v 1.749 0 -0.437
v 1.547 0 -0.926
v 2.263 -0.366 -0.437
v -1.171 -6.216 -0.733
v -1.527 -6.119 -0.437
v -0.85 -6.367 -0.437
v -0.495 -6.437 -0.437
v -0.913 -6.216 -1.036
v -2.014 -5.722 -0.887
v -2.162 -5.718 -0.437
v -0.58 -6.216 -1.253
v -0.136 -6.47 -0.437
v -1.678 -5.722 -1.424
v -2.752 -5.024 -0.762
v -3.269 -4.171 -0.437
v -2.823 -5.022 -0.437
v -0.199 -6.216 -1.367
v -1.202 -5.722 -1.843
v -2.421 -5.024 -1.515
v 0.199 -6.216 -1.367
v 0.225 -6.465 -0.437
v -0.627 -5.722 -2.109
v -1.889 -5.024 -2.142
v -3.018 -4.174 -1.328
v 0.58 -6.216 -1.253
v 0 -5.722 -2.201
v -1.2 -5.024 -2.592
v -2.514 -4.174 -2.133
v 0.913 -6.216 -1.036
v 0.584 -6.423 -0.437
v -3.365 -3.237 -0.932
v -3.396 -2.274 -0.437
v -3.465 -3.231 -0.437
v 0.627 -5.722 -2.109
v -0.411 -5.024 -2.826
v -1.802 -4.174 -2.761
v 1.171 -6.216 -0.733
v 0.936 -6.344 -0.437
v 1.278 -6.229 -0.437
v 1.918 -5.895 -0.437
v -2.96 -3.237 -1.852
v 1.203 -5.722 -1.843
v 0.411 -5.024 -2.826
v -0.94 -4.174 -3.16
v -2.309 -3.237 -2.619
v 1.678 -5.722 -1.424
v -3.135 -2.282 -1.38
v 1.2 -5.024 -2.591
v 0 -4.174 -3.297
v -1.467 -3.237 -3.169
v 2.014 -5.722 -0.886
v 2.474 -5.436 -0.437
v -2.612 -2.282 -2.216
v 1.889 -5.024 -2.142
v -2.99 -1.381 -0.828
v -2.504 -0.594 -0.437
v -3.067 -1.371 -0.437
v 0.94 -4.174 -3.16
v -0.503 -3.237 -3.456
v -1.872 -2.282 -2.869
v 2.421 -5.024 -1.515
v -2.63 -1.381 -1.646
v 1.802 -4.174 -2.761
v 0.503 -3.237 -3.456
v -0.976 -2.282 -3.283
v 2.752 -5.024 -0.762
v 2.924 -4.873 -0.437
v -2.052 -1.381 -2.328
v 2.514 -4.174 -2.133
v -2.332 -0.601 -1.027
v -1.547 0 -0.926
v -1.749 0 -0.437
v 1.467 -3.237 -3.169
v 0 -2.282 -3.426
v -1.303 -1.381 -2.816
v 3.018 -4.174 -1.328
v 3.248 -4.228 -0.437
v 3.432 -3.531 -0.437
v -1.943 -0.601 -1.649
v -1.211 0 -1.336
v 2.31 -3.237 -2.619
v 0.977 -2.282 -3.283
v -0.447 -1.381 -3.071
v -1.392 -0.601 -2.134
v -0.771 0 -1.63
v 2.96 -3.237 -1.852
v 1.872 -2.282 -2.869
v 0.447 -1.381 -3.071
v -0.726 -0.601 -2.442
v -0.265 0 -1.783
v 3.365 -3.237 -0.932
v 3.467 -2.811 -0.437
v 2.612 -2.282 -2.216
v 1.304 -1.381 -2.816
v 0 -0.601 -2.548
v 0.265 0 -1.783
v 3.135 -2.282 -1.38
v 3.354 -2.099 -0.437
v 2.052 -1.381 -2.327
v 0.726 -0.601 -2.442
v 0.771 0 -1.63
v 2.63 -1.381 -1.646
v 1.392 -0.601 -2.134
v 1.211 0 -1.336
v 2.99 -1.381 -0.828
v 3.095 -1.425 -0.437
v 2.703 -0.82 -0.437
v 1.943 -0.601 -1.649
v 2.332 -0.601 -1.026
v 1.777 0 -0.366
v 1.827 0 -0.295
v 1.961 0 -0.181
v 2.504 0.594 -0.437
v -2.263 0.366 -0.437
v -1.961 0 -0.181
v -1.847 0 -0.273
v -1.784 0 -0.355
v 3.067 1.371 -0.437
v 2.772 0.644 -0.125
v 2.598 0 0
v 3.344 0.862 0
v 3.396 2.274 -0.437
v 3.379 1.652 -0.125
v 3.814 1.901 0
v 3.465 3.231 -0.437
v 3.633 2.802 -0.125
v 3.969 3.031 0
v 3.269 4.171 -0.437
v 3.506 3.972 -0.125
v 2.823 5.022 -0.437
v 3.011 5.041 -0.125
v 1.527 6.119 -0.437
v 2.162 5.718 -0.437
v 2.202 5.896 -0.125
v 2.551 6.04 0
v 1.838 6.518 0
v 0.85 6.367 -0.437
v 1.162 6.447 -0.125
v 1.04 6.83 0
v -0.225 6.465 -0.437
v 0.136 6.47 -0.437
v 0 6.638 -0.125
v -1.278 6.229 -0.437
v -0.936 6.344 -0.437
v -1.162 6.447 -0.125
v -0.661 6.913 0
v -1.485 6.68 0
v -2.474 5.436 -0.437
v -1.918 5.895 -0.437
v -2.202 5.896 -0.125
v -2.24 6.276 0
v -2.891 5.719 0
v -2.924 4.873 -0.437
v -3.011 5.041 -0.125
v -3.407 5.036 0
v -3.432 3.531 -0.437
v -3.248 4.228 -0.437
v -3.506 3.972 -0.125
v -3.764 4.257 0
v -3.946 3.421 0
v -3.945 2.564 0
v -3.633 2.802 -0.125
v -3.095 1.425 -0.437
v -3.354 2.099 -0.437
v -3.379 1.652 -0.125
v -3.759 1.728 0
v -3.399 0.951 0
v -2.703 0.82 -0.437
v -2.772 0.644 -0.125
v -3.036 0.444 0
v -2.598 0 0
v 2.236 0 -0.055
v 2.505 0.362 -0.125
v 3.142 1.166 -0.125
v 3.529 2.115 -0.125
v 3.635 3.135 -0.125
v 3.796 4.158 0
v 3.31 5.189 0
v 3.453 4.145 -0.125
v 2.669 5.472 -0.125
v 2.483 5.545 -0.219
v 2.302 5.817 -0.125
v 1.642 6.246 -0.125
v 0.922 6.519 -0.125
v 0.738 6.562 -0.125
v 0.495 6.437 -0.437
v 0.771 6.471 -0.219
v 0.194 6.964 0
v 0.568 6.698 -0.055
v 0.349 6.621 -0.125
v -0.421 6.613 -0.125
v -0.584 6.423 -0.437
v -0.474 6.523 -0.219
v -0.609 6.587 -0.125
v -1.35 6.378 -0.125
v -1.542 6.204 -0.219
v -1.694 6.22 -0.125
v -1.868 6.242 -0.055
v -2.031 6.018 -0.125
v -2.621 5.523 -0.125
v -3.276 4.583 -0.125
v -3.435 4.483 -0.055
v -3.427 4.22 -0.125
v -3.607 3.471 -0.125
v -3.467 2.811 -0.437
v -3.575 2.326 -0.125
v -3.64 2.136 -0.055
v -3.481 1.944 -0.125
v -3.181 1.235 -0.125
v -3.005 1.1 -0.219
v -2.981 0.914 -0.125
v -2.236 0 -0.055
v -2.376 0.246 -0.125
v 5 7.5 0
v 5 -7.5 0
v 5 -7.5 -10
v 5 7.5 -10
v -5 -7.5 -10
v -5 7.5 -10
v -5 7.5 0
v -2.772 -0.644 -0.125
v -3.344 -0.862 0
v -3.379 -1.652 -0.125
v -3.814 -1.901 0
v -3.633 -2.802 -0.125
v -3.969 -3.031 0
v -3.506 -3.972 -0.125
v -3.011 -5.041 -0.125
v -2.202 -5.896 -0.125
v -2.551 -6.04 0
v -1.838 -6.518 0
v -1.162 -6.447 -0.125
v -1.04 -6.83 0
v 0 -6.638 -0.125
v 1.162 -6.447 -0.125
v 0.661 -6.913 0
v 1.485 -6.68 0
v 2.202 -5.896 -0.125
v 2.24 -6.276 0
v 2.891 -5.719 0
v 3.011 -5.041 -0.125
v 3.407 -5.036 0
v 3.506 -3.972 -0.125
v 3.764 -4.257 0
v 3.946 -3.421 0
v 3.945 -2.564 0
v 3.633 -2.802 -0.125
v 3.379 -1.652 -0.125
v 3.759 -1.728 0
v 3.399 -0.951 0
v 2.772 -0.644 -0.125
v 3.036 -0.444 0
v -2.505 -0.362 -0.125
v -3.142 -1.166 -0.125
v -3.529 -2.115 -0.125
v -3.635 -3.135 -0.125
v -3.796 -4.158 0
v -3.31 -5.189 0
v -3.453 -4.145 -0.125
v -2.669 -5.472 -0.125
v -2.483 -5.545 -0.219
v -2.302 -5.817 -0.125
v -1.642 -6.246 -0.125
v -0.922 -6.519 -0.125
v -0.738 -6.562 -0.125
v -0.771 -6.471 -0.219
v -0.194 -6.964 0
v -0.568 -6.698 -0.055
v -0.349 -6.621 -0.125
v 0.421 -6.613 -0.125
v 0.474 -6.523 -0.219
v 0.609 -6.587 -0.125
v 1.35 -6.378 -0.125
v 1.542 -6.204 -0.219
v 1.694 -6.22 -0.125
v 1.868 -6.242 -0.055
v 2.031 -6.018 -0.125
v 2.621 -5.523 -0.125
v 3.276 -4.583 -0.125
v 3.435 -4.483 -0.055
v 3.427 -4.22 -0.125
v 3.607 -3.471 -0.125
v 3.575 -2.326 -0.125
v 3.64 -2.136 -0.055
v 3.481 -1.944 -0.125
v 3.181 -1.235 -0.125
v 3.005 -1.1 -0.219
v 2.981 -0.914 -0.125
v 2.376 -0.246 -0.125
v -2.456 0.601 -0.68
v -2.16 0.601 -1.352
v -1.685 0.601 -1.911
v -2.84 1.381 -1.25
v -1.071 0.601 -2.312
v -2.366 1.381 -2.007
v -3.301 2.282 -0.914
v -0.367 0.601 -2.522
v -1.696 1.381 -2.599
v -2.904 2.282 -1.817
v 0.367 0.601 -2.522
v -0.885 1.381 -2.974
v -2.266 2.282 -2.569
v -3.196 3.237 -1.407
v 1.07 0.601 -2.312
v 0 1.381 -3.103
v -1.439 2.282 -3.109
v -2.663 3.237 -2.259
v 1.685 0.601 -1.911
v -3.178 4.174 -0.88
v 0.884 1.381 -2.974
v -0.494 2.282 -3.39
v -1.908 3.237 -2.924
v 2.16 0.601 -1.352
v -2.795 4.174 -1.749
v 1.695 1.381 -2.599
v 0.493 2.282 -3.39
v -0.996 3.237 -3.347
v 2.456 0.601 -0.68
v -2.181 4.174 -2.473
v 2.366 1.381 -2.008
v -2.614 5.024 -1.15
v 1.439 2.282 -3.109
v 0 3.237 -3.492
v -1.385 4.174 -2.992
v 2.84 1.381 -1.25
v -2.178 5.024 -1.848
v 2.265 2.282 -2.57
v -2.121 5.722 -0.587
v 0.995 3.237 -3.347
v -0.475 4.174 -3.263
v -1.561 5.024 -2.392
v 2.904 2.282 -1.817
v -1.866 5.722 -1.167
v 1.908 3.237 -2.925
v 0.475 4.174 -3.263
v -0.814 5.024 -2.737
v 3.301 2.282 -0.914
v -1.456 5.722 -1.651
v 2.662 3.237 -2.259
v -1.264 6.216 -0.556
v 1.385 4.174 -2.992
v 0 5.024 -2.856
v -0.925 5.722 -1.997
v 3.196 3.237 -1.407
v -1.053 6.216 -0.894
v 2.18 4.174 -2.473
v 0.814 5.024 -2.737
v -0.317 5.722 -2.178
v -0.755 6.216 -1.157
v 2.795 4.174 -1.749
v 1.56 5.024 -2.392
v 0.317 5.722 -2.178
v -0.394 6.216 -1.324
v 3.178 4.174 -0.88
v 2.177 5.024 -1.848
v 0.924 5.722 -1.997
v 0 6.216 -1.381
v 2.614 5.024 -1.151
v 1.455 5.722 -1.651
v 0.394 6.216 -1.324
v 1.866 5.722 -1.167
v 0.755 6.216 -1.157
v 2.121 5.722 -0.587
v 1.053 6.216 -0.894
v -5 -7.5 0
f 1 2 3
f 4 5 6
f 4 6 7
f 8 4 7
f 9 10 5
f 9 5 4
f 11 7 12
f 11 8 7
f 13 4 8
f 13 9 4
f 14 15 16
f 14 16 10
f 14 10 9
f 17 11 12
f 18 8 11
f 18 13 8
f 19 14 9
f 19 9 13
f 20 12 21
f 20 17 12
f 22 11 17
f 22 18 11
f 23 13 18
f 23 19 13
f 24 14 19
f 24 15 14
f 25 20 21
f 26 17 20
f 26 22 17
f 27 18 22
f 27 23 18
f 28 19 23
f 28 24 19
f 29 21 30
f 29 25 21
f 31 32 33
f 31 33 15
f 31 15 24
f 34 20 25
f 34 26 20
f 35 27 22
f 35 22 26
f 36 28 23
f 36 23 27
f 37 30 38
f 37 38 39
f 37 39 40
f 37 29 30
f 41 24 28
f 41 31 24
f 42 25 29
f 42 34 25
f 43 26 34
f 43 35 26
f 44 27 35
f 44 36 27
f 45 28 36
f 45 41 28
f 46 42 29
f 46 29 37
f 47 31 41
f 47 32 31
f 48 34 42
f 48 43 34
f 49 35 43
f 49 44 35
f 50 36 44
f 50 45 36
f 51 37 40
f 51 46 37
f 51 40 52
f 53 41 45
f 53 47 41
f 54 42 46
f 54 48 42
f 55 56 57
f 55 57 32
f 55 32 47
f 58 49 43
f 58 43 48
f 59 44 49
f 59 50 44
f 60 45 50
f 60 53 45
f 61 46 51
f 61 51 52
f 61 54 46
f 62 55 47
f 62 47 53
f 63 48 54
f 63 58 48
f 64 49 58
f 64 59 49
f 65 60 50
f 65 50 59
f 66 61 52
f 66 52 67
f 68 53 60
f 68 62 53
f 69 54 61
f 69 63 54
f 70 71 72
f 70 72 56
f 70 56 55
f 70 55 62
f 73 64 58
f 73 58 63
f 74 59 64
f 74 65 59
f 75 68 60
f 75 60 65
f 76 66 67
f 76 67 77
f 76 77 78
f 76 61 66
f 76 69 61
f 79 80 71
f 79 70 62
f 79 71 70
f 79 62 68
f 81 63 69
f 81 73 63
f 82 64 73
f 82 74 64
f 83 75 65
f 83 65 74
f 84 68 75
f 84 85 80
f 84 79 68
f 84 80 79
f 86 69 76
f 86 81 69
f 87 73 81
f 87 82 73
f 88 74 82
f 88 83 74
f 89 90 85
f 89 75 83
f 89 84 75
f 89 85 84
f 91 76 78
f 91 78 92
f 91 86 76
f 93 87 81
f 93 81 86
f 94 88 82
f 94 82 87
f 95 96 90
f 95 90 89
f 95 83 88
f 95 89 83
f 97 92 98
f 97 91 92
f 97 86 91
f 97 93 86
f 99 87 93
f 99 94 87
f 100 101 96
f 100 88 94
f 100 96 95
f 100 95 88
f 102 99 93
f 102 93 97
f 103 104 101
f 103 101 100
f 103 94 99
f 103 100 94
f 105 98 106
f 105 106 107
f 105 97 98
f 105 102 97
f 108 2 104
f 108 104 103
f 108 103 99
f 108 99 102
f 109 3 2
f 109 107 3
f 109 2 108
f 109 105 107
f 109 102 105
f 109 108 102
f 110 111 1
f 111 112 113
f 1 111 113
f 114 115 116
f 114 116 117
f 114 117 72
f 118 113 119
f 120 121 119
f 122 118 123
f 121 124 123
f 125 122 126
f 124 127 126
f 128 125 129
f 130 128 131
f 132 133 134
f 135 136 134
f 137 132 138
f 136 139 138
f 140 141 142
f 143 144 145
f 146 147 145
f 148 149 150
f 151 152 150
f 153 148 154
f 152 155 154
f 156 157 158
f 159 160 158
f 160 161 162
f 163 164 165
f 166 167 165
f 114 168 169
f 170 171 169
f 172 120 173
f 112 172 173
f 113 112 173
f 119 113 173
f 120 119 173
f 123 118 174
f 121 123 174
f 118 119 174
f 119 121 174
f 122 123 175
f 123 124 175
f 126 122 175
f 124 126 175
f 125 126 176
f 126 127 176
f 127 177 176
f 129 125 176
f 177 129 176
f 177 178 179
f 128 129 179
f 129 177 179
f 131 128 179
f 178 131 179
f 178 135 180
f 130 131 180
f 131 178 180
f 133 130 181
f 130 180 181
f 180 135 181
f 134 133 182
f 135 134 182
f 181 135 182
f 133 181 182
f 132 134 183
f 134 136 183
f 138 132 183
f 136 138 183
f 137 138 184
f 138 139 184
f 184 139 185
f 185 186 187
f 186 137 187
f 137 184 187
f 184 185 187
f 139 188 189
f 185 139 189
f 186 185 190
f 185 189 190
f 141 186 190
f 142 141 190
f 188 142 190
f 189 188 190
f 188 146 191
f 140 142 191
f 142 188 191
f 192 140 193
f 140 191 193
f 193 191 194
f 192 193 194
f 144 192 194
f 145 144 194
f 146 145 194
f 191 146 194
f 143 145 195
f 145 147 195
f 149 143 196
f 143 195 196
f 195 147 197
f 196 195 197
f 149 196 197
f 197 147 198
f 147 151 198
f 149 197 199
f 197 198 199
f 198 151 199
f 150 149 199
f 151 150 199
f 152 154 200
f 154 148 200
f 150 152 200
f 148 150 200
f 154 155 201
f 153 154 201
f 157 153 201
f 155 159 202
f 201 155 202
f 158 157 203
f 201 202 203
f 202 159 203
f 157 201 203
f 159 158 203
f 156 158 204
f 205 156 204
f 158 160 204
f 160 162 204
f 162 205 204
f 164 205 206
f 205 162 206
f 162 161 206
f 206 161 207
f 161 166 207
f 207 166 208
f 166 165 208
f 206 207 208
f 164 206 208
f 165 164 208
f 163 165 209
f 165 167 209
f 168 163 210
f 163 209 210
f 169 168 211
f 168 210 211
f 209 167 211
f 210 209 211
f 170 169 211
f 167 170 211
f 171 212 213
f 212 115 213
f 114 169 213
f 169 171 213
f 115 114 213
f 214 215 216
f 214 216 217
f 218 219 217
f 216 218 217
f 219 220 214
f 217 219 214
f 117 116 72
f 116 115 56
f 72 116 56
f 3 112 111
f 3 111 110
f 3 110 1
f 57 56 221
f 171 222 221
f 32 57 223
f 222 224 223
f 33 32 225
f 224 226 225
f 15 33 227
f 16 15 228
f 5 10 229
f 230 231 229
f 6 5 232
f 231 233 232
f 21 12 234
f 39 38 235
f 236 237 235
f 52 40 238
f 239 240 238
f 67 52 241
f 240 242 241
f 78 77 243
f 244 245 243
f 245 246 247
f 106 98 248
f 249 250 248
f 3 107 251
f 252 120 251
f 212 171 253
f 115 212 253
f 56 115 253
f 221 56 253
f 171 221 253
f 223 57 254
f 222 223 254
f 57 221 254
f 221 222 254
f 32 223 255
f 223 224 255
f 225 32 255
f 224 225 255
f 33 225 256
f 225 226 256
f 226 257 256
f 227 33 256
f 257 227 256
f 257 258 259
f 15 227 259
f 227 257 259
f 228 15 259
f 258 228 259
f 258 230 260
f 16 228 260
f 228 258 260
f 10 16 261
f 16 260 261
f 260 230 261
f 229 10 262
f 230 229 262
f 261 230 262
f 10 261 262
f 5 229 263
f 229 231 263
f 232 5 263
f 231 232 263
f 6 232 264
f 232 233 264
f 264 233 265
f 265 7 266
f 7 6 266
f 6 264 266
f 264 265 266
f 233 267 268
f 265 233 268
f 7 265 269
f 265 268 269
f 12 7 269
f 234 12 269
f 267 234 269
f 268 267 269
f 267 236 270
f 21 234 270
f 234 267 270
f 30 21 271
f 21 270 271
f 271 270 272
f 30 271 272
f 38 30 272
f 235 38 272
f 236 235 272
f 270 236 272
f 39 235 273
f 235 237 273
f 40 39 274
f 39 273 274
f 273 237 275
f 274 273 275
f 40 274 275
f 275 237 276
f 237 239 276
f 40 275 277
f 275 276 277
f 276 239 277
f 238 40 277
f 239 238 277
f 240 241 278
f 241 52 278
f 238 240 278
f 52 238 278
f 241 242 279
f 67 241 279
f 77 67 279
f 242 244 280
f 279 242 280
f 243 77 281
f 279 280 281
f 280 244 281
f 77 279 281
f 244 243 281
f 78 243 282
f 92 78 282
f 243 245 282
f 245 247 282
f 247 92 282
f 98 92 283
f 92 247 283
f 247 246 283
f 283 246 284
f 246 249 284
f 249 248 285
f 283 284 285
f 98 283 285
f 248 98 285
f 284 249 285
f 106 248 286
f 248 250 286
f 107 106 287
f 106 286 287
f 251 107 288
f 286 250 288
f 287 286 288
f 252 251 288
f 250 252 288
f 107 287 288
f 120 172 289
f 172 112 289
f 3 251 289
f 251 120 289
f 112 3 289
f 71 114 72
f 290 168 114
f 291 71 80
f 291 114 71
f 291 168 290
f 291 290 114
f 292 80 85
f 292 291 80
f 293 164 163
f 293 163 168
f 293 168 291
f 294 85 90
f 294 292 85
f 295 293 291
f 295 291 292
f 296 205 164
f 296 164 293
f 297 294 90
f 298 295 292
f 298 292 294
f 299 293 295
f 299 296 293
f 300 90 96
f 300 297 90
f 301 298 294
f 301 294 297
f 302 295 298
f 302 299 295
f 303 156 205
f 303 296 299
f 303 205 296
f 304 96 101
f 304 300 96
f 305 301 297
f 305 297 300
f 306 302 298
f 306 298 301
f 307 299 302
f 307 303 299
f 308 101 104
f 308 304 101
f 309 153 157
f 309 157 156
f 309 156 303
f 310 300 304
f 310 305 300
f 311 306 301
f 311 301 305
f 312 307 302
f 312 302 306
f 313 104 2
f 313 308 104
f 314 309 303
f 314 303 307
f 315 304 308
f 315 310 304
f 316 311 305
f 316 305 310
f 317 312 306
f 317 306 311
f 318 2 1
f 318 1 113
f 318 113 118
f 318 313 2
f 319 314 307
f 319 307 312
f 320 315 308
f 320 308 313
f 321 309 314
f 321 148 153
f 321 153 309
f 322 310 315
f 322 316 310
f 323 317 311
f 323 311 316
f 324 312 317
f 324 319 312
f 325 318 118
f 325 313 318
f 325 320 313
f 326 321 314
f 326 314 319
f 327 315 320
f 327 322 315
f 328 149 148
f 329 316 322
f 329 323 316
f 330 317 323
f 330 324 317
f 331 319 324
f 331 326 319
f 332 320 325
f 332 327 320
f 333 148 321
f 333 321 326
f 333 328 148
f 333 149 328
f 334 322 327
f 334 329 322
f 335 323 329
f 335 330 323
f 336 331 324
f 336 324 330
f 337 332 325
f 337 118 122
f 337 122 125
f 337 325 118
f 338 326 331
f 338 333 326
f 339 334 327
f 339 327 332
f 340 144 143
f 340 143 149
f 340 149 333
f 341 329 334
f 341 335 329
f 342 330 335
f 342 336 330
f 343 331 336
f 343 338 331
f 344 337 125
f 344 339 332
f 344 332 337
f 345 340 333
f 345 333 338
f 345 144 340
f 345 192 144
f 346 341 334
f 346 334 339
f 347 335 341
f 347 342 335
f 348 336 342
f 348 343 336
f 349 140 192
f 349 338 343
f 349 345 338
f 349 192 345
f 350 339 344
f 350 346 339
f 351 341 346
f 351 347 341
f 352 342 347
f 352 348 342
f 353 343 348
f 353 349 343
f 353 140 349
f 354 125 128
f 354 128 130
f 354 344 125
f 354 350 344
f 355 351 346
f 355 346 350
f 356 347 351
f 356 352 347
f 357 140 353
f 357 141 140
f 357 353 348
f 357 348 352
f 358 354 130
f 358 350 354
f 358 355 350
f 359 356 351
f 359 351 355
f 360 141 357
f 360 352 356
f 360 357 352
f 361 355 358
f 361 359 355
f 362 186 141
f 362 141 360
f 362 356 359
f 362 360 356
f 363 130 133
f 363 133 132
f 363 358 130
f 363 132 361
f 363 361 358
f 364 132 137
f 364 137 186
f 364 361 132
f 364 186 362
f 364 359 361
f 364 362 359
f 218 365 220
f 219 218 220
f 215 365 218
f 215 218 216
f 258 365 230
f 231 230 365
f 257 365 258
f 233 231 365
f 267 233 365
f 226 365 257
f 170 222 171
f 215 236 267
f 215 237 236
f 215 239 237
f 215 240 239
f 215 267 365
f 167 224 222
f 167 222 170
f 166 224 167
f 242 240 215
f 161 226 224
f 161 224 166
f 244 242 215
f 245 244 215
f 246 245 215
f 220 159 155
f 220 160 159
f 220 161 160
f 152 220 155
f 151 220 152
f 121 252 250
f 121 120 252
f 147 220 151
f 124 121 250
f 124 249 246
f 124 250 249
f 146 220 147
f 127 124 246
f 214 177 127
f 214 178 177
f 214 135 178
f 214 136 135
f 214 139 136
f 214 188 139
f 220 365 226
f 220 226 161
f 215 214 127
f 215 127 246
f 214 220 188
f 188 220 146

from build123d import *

# Parameters (mm, degrees)
F0_W     = 10
F0_H     = 15
F1_DEPTH = 10
F4_R     = 0.5


with BuildPart() as f1:
    # F0 (on Top) → F1 (new body)
    with BuildSketch(Plane.XY):
        Rectangle(F0_W, F0_H)
    extrude(amount=-F1_DEPTH)

    # F2 (on face) → F3 (revolve, cut)
    with BuildSketch(Plane.XY):
        with BuildLine():
            ThreePointArc((1.8027756377, 0), (3.3726843908, 3.9354143467), (0, 6.5))
            Line((0, 6.5), (0, 0.5))
            ThreePointArc((0, 0.5), (0.9354143467, 0.3726843908), (1.8027756377, 0))
        make_face()
        with BuildLine():
            ThreePointArc((1.8027756377, 0), (0.9354143467, 0.3726843908), (0, 0.5))
            Line((0, 0.5), (0, -0.5))
            ThreePointArc((0, -0.5), (0.9354143467, -0.3726843908), (1.8027756377, 0))
        make_face()
        with BuildLine():
            ThreePointArc((0, -6.5), (3.3726843908, -3.9354143467), (1.8027756377, 0))
            ThreePointArc((1.8027756377, 0), (0.9354143467, -0.3726843908), (0, -0.5))
            Line((0, -0.5), (0, -6.5))
        make_face()
    revolve(axis=Axis((0, 0.2168327096, 0), (0, -1, 0)), mode=Mode.SUBTRACT)

    # F4
    f4_edges = [f1.edges().sort_by_distance(p)[0] for p in [
        (3.372684, 3.935414, 0),
        (-3.372684, 3.935414, 0),
        (3.372684, -3.935414, 0),
        (-3.372684, -3.935414, 0),
    ]]
    fillet(f4_edges, radius=F4_R)


solid = f1.part
